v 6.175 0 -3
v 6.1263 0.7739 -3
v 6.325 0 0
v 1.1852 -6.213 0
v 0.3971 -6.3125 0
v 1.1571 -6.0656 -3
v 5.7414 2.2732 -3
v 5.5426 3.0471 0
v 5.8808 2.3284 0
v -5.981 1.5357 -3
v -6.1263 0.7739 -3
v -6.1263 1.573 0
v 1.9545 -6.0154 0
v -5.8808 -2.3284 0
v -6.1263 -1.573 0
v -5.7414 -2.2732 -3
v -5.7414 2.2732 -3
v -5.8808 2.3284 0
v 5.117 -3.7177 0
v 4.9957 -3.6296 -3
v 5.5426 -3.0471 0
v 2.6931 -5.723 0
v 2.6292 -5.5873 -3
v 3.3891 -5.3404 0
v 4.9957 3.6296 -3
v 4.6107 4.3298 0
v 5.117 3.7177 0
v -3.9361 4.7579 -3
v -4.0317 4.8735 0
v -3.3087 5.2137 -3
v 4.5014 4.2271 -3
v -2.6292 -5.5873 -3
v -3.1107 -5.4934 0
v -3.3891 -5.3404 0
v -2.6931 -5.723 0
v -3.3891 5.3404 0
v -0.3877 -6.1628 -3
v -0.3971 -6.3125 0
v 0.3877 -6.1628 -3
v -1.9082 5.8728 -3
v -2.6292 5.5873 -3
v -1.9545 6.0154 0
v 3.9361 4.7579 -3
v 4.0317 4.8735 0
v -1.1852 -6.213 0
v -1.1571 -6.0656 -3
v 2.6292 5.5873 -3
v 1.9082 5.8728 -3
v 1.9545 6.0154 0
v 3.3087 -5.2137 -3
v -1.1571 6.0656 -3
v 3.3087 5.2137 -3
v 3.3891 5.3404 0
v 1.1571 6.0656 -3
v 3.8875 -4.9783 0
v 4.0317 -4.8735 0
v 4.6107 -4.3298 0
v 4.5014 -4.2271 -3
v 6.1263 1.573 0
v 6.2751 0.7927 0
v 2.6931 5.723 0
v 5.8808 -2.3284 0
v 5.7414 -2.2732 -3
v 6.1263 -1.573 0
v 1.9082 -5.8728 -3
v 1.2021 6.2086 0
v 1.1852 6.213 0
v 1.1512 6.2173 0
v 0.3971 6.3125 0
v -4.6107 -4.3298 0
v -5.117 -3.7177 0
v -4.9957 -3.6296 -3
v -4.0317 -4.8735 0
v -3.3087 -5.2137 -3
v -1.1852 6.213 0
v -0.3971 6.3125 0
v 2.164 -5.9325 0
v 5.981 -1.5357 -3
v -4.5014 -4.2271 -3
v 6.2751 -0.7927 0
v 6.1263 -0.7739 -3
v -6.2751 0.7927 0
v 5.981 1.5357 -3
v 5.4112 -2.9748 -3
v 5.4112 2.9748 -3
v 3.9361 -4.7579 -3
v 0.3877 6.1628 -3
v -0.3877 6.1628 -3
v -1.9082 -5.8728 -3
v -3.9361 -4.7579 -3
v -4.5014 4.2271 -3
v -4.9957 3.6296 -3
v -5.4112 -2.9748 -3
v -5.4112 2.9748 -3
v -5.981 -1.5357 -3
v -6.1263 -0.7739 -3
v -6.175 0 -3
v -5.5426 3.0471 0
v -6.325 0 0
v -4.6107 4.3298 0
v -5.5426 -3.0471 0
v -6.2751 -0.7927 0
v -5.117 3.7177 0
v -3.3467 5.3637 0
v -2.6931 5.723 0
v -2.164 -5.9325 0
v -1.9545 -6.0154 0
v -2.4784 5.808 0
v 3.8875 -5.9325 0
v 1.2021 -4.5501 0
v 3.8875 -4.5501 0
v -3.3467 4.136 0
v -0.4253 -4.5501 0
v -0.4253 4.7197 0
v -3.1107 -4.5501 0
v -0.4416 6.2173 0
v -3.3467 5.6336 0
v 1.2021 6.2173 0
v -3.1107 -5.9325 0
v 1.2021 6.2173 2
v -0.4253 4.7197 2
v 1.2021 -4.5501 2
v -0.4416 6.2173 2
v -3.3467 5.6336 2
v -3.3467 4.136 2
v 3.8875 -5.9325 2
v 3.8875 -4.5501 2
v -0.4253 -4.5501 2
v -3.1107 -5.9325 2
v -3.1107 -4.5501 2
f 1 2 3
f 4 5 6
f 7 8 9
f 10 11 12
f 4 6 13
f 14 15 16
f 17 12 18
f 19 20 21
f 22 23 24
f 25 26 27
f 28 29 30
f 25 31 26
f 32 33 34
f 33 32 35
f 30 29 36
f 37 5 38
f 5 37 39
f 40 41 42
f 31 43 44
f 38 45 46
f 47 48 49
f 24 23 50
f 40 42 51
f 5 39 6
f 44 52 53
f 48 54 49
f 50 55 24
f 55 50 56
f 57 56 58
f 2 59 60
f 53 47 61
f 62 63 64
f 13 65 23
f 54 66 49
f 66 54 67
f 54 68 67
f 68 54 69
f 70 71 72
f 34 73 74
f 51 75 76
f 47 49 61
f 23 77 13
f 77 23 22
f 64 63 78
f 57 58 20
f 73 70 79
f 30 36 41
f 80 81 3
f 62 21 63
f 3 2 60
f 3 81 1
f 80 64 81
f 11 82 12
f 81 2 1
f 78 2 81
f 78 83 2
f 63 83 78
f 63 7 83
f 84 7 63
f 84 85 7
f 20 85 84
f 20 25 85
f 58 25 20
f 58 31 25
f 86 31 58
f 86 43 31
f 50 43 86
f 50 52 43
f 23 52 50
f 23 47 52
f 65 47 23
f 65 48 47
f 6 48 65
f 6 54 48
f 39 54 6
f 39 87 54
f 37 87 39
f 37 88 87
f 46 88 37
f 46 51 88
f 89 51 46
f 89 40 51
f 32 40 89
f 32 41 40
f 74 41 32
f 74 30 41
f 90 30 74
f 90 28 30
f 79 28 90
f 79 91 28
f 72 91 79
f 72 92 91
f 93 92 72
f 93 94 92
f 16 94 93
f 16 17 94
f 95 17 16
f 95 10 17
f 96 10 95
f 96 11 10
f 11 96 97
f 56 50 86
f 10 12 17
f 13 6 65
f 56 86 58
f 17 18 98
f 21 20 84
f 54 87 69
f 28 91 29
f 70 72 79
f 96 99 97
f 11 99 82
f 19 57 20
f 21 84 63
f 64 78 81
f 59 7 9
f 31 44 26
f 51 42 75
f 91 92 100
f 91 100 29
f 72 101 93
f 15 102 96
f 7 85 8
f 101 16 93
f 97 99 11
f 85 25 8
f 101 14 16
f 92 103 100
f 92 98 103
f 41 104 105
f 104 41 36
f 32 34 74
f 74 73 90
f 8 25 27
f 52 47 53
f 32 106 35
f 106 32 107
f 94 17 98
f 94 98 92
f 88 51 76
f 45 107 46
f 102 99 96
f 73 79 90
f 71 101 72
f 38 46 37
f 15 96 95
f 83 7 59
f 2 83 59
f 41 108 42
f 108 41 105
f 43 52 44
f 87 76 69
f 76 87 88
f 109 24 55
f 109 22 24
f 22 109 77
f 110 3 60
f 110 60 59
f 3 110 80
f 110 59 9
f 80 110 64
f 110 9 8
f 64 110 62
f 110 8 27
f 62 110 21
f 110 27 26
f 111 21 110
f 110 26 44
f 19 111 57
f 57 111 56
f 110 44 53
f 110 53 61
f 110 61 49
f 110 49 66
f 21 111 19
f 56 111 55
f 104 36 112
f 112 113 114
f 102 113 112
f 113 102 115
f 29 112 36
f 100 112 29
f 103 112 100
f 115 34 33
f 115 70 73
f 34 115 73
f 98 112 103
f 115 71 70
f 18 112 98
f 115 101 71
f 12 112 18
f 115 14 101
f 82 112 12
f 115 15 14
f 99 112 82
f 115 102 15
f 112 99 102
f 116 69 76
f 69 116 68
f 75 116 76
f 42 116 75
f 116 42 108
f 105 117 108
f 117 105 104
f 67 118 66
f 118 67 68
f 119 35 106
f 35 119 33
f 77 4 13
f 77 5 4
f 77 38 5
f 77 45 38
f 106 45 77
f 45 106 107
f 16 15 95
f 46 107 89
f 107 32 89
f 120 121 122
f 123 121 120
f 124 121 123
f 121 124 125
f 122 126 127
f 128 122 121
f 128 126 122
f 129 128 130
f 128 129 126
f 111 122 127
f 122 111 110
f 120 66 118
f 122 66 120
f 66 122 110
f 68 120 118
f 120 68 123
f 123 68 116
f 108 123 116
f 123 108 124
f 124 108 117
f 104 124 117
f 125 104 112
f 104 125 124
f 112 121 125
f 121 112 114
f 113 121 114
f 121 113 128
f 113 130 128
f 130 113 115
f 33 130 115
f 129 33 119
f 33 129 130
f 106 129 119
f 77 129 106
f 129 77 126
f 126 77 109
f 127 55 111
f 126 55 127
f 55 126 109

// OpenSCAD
$fn = 50;


difference() {
	union() {
		translate(v = [0, 0, -3.0000000000]) {
			cylinder(h = 3, r1 = 6.1750000000, r2 = 6.3250000000);
		}
		linear_extrude(height = 2) {
			text(font = "Impact", halign = "center", size = 12, text = "1", valign = "center");
		}
	}
	union();
}
